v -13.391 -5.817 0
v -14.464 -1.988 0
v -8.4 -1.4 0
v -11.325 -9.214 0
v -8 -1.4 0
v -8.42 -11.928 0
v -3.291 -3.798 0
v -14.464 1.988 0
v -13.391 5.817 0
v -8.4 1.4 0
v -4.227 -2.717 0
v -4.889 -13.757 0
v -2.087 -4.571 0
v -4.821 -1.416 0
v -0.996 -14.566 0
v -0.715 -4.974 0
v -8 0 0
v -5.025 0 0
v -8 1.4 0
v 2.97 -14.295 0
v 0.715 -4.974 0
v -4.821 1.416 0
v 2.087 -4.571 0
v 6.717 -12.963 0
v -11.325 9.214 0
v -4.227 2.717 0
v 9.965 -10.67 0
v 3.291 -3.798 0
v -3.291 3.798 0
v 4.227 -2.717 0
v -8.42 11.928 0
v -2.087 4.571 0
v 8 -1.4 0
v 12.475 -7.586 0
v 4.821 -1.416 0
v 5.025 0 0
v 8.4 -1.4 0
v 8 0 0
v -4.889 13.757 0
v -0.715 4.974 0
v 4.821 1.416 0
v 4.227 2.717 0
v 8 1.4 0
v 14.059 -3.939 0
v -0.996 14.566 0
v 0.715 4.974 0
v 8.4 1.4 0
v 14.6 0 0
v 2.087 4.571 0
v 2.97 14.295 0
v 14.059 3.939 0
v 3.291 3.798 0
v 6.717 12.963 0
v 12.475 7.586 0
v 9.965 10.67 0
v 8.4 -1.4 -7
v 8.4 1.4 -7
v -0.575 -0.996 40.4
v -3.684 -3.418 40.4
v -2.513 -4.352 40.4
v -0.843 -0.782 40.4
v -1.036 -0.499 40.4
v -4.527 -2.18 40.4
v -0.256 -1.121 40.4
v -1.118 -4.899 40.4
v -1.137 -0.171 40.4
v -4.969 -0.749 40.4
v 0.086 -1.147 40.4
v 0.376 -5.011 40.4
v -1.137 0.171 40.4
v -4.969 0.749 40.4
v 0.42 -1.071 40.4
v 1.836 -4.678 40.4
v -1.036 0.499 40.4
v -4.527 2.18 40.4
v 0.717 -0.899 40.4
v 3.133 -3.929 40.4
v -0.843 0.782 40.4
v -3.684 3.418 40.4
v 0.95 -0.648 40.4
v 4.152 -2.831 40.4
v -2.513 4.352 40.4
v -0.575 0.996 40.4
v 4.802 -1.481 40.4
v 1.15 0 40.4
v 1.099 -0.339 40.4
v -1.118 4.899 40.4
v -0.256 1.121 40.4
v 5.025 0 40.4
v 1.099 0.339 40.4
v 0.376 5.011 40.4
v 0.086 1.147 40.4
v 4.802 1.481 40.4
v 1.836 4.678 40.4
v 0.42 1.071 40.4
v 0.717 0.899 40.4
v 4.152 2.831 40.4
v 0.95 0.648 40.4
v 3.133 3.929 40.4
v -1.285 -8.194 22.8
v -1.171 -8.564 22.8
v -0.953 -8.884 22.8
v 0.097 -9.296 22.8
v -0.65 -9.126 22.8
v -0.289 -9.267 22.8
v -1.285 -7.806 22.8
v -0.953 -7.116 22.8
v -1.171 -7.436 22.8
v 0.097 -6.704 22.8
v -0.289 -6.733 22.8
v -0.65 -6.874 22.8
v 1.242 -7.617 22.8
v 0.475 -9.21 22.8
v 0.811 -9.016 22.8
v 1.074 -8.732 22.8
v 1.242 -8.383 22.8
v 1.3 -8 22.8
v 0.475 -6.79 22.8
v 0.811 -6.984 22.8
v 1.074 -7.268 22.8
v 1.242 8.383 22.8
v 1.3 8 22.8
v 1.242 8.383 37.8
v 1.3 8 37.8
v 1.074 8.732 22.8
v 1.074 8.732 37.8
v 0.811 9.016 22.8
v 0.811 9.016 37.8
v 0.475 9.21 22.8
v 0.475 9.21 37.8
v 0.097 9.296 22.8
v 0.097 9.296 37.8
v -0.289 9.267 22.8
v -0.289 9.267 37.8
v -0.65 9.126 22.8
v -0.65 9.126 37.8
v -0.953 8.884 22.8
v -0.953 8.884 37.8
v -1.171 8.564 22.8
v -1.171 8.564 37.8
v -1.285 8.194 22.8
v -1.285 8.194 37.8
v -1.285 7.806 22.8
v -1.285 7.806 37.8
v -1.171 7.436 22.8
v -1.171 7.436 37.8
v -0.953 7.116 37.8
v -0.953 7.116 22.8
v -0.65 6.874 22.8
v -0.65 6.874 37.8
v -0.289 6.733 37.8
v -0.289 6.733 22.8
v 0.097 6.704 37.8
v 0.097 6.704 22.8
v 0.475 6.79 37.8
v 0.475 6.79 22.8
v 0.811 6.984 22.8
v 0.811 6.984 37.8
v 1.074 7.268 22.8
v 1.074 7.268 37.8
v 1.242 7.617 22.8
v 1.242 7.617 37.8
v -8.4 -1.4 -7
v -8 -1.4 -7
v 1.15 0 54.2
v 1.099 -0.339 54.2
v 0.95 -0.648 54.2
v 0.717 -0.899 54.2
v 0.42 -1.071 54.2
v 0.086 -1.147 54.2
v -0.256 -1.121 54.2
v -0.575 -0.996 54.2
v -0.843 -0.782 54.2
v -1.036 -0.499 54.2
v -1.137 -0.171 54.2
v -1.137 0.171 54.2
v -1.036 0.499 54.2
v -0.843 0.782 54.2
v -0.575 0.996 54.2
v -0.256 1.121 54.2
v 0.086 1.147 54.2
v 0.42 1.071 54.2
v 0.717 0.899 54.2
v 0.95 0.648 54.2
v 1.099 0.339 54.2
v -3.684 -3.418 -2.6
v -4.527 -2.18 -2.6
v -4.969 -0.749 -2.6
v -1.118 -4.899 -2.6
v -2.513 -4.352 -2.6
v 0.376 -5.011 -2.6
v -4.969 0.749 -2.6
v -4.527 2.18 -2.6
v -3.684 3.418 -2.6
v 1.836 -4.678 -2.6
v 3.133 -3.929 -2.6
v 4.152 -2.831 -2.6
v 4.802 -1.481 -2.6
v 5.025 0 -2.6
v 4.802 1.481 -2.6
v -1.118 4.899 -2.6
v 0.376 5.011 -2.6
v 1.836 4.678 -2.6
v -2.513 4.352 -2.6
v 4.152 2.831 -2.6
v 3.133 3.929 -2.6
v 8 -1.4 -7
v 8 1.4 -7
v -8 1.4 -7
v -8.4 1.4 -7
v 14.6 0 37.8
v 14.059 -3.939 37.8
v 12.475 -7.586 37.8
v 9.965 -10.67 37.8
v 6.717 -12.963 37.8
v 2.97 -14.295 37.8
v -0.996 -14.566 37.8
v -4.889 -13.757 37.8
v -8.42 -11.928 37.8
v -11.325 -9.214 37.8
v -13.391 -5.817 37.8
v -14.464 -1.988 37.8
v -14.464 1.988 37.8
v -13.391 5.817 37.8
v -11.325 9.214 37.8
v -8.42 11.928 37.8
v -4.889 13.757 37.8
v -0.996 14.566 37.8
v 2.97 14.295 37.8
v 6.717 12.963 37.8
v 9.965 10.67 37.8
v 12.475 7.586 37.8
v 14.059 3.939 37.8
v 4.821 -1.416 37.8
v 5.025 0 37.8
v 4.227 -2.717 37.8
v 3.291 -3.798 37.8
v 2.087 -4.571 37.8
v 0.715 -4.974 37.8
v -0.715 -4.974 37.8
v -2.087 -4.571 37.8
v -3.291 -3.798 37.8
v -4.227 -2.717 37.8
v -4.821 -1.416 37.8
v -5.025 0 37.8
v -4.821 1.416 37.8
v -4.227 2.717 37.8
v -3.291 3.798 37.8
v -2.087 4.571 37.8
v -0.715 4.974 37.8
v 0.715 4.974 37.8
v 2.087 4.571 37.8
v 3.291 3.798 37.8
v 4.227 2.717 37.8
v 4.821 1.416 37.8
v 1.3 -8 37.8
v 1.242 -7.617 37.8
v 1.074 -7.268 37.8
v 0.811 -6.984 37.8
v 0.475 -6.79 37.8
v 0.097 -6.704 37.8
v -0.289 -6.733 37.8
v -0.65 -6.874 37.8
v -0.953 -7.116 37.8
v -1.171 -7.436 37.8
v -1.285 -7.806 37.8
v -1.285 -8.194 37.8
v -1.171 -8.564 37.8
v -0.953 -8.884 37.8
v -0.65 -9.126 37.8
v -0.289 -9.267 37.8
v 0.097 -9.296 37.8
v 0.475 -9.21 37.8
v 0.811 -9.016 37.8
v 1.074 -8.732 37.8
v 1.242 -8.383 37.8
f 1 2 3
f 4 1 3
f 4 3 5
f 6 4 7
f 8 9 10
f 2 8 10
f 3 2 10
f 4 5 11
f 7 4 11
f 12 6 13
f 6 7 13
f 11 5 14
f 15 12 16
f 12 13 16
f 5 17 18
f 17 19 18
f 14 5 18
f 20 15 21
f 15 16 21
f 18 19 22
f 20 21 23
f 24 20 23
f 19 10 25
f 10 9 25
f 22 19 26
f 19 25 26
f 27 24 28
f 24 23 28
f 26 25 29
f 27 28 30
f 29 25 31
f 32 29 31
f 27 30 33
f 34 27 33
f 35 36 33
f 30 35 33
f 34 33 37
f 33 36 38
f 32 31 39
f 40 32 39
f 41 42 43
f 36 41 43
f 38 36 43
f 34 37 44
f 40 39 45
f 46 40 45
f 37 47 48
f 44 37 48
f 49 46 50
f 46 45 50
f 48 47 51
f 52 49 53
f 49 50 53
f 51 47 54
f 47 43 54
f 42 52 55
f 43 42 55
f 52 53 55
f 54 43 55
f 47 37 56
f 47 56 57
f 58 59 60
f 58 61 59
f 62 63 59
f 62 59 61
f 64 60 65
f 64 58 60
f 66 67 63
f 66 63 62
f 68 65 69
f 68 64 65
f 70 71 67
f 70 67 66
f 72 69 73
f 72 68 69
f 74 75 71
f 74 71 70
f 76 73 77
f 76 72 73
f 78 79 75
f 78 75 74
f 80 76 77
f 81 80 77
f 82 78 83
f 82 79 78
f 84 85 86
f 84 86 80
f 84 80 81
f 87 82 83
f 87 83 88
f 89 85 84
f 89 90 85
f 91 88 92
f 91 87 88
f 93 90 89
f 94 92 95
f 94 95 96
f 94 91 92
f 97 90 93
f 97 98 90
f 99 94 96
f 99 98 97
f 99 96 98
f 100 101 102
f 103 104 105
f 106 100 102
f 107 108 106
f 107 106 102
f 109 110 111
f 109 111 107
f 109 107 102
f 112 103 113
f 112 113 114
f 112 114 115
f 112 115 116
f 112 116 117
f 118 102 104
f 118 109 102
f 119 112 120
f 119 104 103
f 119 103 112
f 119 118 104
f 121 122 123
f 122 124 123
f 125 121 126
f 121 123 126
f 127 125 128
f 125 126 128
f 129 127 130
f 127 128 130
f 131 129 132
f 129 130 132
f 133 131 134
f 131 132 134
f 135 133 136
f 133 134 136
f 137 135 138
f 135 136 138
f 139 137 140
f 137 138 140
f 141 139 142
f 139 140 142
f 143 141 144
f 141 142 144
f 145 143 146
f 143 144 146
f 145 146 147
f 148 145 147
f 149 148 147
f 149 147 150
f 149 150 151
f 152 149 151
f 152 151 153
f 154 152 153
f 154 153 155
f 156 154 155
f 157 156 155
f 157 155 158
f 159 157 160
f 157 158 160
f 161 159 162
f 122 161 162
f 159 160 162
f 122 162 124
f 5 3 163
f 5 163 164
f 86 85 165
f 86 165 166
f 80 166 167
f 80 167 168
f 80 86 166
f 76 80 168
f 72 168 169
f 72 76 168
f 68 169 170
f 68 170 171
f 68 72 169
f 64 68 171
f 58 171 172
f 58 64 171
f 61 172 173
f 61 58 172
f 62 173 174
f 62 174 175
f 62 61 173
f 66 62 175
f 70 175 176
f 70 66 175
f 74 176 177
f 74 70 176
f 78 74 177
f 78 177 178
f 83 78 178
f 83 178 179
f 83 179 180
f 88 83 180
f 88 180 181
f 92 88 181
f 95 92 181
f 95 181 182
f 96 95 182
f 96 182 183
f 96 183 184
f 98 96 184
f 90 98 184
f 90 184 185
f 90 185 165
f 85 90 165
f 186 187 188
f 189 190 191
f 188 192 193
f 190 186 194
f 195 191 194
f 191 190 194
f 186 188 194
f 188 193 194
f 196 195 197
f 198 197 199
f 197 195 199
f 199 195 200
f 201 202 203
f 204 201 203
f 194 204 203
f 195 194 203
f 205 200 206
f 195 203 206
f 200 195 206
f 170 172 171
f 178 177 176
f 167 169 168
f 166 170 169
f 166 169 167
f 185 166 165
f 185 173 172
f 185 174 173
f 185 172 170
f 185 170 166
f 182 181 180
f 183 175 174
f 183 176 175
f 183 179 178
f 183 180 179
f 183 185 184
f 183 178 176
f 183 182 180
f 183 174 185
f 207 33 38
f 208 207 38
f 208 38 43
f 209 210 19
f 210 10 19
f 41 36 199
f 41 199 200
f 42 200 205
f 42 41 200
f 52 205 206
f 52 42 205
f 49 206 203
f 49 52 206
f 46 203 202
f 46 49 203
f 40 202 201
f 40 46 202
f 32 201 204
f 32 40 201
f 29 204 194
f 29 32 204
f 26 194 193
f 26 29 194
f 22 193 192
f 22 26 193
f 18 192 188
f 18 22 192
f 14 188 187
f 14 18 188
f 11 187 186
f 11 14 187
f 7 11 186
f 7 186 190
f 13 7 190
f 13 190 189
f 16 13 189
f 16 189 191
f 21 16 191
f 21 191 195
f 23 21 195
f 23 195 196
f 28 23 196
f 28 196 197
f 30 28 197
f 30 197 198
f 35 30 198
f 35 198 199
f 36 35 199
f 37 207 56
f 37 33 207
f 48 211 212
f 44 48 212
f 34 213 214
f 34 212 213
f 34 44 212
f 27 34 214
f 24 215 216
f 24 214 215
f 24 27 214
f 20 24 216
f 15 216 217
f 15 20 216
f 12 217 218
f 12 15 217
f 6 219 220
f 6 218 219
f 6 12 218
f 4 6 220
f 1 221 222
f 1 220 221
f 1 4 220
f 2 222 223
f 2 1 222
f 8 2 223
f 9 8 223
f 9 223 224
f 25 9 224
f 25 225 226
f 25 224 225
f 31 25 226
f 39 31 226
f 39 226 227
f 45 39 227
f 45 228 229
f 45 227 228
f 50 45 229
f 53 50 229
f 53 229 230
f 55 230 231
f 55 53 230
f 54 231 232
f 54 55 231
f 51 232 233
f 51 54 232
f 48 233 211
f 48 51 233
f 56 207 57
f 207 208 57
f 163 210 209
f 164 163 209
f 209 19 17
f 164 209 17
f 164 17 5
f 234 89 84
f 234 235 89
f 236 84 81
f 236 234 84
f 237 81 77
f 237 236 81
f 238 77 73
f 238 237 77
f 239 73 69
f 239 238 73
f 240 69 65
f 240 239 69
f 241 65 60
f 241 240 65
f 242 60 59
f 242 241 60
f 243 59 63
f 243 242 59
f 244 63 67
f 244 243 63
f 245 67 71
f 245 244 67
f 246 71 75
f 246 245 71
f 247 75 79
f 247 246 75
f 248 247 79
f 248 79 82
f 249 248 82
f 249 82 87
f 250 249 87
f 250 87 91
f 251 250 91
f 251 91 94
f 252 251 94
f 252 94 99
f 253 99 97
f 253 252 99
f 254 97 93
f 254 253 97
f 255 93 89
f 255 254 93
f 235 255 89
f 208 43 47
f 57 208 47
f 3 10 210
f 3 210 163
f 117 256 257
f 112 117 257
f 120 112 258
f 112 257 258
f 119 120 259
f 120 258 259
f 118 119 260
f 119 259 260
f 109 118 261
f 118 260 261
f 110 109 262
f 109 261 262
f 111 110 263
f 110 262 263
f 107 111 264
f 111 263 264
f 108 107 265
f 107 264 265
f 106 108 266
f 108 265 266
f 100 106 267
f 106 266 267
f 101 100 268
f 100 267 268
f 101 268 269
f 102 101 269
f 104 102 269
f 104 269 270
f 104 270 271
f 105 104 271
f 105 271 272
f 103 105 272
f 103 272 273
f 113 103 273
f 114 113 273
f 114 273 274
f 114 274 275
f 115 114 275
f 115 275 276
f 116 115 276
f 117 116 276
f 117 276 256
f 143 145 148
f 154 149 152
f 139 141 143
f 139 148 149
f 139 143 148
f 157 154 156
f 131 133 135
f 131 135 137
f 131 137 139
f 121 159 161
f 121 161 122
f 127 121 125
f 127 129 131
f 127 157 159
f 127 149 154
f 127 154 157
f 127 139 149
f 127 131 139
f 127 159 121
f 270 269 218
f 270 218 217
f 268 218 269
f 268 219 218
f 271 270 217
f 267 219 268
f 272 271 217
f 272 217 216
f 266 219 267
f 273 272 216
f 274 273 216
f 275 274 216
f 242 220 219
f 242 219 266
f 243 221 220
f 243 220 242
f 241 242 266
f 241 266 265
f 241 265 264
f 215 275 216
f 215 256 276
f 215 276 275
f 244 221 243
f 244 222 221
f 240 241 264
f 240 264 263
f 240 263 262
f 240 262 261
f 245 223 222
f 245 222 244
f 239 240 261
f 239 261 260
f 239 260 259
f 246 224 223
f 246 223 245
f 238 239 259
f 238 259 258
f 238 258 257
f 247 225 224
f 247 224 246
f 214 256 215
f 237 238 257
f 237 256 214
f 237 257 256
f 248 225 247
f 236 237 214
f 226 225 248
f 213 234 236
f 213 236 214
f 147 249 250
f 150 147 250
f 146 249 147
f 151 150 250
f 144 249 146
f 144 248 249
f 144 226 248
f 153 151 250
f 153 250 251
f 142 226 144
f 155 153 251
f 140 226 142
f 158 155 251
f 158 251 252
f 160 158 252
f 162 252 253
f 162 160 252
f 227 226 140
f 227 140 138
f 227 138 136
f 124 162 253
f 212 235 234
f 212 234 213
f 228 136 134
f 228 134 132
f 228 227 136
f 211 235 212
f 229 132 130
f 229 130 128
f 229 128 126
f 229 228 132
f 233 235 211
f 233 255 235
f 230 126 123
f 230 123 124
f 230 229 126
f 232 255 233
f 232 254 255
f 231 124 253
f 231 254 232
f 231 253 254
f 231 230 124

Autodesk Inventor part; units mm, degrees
ref_plane "YZ Plane" through (0, 0, 0) normal (1, 0, 0) x (0, 1, 0)
ref_plane "XZ Plane" through (0, 0, 0) normal (0, 1, 0) x (-1, 0, 0)
ref_plane "XY Plane" through (0, 0, 0) normal (0, 0, 1) x (1, 0, 0)
sketch "スケッチ1" plane through (0, 0, 0) normal (0, 0, 1) x (1, 0, 0)
  circle A0 centre (0, 0) radius 14.6
  circle A1 centre (0, 0) radius 5.025
  line L0 (0, 0) -> (8, 0)
  line L1 (0, 0) -> (-8, 0)
  circle A2 centre (0, 0) radius 1.15
  line L2 (-8, 0) -> (-8, -1.4)
  line L3 (-8, -1.4) -> (-8, 1.4)
  line L4 (8, 0) -> (8, -1.4)
  line L5 (8, -1.4) -> (8, 1.4)
  line L6 (8.4, -1.4) -> (8.4, 1.4)
  line L7 (-8.4, 1.4) -> (-8.4, -1.4)
  line L8 (-8.4, -1.4) -> (-8, -1.4)
  line L9 (-8.4, 1.4) -> (-8, 1.4)
  line L10 (8, -1.4) -> (8.4, -1.4)
  line L11 (8, 1.4) -> (8.4, 1.4)
  dimension "d0" = 29.2
  dimension "d1" = 10.05
  dimension "d2" = 8
  dimension "d3" = 8
  dimension "d6" = 2.3
  dimension "d21" = 1.4
  dimension "d22" = 2.8
  dimension "d23" = 1.4
  dimension "d24" = 2.8
  dimension "d25" = 0.4
  dimension "d26" = 0.4
extrude "押し出し1" add sketch "スケッチ1" along normal blind 37.8 contours A0 | L0 A2 L1 A1 | L2 L8 L7 L9 L3 | A1 L1 A2 L0 | L5 L11 L6 L10 L4 | A2 L1 L0 | L0 L1 A2
extrude "押し出し2" add sketch "スケッチ1" against normal blind 2.6 contours L0 A2 L1 A1 | A1 L1 A2 L0 | A2 L1 L0 | L0 L1 A2
extrude "押し出し3" add sketch "スケッチ1" along normal blind 40.4 contours L0 A2 L1 A1 | A1 L1 A2 L0 | A2 L1 L0 | L0 L1 A2
extrude "押し出し4" add sketch "スケッチ1" along normal blind 54.2 contours A2 L1 L0 | L0 L1 A2
sketch "スケッチ2" plane through (0, 0, 37.8) normal (0, 0, 1) x (1, 0, 0)
  line L0 (0, 0) -> (0, 8)
  line L1 (0, 0) -> (0, -8)
  circle A0 centre (0, -8) radius 1.3
  circle A1 centre (0, 8) radius 1.3
  dimension "d15" = 8
  dimension "d16" = 8
  dimension "d17" = 2.6
  dimension "d18" = 2.6
extrude "押し出し5" cut sketch "スケッチ2" against normal blind 15
extrude "押し出し6" add sketch "スケッチ1" against normal blind 7 contours L2 L8 L7 L9 L3 | L5 L11 L6 L10 L4
properties part number "モーター(形だけ)"
